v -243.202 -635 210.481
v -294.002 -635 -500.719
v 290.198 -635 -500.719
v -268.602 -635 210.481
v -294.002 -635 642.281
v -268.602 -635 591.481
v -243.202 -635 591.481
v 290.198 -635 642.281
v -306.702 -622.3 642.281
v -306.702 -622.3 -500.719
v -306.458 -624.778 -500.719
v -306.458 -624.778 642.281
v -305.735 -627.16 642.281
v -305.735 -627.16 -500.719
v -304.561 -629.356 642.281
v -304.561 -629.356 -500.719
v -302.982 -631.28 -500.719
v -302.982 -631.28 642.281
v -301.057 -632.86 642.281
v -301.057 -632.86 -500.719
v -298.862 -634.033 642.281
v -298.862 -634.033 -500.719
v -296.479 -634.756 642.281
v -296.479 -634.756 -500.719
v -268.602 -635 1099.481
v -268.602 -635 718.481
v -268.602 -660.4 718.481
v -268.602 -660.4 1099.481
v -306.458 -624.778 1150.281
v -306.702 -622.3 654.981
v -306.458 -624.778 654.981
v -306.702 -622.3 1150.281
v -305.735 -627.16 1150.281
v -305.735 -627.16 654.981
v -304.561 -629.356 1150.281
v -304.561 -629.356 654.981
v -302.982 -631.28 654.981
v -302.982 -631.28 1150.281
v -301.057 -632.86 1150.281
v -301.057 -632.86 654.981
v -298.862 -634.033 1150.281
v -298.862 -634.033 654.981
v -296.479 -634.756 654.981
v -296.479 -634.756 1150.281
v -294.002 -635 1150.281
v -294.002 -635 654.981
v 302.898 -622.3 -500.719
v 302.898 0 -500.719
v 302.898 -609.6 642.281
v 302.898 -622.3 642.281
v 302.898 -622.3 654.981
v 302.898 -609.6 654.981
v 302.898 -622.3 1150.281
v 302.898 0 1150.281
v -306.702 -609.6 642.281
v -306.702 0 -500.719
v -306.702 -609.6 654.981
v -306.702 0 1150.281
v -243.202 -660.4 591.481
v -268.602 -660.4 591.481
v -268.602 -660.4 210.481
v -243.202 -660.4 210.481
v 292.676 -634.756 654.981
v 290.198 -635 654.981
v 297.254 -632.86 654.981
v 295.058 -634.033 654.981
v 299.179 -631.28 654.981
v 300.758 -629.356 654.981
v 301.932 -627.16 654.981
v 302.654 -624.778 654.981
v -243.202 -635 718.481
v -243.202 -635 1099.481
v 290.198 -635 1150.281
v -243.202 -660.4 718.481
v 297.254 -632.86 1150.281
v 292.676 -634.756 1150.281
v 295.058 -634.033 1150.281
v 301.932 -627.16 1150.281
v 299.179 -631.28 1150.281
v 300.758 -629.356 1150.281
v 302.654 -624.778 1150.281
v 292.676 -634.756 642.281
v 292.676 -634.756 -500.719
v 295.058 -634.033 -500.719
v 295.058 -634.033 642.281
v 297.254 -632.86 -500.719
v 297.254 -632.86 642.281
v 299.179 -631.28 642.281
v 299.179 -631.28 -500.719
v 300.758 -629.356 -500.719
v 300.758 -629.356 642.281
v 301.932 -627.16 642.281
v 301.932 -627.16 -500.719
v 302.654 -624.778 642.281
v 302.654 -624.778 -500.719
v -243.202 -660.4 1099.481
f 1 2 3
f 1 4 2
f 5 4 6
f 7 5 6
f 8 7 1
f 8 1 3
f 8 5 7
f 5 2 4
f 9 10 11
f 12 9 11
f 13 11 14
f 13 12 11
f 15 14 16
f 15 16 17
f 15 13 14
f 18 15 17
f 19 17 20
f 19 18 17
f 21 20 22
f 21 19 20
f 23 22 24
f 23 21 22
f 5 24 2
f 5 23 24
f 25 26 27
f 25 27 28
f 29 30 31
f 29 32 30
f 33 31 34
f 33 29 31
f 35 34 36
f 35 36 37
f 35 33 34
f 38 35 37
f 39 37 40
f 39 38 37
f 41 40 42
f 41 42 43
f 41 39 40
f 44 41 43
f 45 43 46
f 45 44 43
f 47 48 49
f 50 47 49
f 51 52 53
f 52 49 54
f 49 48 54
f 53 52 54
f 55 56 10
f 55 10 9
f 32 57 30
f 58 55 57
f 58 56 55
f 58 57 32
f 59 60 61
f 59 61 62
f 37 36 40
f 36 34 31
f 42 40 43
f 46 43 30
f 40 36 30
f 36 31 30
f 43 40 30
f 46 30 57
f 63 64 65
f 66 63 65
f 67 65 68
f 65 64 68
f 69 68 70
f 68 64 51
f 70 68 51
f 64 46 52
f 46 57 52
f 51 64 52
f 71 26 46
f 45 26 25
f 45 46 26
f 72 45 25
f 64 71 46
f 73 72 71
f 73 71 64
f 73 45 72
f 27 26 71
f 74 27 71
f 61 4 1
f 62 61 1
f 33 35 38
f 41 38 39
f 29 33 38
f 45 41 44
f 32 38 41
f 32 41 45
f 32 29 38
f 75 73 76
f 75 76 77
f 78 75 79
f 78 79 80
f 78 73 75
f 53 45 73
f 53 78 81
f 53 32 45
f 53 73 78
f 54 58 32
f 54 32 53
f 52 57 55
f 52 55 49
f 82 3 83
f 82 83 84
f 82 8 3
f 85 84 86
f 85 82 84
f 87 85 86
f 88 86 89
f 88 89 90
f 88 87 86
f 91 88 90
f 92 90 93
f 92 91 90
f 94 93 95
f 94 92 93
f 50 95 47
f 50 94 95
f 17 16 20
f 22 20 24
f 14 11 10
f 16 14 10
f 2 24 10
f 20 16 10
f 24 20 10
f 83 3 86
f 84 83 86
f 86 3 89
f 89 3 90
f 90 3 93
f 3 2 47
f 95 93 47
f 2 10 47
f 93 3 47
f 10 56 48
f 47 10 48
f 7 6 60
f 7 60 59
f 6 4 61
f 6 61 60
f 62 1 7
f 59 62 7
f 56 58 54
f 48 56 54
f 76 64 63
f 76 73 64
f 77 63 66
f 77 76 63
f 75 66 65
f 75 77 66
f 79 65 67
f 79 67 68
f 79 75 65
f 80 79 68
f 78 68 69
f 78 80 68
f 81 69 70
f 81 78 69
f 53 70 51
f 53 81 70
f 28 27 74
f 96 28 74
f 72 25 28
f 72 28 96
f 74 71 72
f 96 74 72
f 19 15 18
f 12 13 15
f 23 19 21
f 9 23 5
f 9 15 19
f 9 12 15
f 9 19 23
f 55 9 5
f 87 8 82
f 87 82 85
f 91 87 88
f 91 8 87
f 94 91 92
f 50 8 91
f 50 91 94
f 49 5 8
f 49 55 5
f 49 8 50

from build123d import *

# Parameters (mm, degrees)
F0_W     = 609.6
F0_H     = 1651
F1_DEPTH = 609.6
F2_W     = 609.6
F2_H     = 1143
F2_H_2   = 495.3
F3_DEPTH = 25.4
F4_W     = 25.4
F4_H     = 381
F5_DEPTH = 25.4
F6_R     = 12.7


with BuildPart() as f1:
    # F0 (on Front) → F1 (new body)
    with BuildSketch(Plane.XZ):
        with Locations((-1.901709, 324.781201)):
            Rectangle(F0_W, F0_H)
    extrude(amount=F1_DEPTH)

    # F2 (on face) → F3 (join)
    with BuildSketch(Plane.XZ.offset(609.6)):
        with Locations((-1.901709, 70.781201)):
            Rectangle(F2_W, F2_H)
        with Locations((-1.901709, 902.631201)):
            Rectangle(F2_W, F2_H_2)
    extrude(amount=F3_DEPTH)

    # F4 (on face) → F5 (join)
    with BuildSketch(Plane.XZ.offset(635)):
        with Locations((-255.901709, 908.981201)):
            Rectangle(F4_W, F4_H)
        with Locations((-255.901709, 400.981201)):
            Rectangle(F4_W, F4_H)
    extrude(amount=F5_DEPTH)

    # F6
    f6_edges = [f1.edges().sort_by_distance(p)[0] for p in [
        (302.898291, -635, 902.631201),
        (302.898291, -635, 70.781201),
        (-306.701709, -635, 902.631201),
        (-306.701709, -635, 70.781201),
    ]]
    fillet(f6_edges, radius=F6_R)


solid = f1.part
